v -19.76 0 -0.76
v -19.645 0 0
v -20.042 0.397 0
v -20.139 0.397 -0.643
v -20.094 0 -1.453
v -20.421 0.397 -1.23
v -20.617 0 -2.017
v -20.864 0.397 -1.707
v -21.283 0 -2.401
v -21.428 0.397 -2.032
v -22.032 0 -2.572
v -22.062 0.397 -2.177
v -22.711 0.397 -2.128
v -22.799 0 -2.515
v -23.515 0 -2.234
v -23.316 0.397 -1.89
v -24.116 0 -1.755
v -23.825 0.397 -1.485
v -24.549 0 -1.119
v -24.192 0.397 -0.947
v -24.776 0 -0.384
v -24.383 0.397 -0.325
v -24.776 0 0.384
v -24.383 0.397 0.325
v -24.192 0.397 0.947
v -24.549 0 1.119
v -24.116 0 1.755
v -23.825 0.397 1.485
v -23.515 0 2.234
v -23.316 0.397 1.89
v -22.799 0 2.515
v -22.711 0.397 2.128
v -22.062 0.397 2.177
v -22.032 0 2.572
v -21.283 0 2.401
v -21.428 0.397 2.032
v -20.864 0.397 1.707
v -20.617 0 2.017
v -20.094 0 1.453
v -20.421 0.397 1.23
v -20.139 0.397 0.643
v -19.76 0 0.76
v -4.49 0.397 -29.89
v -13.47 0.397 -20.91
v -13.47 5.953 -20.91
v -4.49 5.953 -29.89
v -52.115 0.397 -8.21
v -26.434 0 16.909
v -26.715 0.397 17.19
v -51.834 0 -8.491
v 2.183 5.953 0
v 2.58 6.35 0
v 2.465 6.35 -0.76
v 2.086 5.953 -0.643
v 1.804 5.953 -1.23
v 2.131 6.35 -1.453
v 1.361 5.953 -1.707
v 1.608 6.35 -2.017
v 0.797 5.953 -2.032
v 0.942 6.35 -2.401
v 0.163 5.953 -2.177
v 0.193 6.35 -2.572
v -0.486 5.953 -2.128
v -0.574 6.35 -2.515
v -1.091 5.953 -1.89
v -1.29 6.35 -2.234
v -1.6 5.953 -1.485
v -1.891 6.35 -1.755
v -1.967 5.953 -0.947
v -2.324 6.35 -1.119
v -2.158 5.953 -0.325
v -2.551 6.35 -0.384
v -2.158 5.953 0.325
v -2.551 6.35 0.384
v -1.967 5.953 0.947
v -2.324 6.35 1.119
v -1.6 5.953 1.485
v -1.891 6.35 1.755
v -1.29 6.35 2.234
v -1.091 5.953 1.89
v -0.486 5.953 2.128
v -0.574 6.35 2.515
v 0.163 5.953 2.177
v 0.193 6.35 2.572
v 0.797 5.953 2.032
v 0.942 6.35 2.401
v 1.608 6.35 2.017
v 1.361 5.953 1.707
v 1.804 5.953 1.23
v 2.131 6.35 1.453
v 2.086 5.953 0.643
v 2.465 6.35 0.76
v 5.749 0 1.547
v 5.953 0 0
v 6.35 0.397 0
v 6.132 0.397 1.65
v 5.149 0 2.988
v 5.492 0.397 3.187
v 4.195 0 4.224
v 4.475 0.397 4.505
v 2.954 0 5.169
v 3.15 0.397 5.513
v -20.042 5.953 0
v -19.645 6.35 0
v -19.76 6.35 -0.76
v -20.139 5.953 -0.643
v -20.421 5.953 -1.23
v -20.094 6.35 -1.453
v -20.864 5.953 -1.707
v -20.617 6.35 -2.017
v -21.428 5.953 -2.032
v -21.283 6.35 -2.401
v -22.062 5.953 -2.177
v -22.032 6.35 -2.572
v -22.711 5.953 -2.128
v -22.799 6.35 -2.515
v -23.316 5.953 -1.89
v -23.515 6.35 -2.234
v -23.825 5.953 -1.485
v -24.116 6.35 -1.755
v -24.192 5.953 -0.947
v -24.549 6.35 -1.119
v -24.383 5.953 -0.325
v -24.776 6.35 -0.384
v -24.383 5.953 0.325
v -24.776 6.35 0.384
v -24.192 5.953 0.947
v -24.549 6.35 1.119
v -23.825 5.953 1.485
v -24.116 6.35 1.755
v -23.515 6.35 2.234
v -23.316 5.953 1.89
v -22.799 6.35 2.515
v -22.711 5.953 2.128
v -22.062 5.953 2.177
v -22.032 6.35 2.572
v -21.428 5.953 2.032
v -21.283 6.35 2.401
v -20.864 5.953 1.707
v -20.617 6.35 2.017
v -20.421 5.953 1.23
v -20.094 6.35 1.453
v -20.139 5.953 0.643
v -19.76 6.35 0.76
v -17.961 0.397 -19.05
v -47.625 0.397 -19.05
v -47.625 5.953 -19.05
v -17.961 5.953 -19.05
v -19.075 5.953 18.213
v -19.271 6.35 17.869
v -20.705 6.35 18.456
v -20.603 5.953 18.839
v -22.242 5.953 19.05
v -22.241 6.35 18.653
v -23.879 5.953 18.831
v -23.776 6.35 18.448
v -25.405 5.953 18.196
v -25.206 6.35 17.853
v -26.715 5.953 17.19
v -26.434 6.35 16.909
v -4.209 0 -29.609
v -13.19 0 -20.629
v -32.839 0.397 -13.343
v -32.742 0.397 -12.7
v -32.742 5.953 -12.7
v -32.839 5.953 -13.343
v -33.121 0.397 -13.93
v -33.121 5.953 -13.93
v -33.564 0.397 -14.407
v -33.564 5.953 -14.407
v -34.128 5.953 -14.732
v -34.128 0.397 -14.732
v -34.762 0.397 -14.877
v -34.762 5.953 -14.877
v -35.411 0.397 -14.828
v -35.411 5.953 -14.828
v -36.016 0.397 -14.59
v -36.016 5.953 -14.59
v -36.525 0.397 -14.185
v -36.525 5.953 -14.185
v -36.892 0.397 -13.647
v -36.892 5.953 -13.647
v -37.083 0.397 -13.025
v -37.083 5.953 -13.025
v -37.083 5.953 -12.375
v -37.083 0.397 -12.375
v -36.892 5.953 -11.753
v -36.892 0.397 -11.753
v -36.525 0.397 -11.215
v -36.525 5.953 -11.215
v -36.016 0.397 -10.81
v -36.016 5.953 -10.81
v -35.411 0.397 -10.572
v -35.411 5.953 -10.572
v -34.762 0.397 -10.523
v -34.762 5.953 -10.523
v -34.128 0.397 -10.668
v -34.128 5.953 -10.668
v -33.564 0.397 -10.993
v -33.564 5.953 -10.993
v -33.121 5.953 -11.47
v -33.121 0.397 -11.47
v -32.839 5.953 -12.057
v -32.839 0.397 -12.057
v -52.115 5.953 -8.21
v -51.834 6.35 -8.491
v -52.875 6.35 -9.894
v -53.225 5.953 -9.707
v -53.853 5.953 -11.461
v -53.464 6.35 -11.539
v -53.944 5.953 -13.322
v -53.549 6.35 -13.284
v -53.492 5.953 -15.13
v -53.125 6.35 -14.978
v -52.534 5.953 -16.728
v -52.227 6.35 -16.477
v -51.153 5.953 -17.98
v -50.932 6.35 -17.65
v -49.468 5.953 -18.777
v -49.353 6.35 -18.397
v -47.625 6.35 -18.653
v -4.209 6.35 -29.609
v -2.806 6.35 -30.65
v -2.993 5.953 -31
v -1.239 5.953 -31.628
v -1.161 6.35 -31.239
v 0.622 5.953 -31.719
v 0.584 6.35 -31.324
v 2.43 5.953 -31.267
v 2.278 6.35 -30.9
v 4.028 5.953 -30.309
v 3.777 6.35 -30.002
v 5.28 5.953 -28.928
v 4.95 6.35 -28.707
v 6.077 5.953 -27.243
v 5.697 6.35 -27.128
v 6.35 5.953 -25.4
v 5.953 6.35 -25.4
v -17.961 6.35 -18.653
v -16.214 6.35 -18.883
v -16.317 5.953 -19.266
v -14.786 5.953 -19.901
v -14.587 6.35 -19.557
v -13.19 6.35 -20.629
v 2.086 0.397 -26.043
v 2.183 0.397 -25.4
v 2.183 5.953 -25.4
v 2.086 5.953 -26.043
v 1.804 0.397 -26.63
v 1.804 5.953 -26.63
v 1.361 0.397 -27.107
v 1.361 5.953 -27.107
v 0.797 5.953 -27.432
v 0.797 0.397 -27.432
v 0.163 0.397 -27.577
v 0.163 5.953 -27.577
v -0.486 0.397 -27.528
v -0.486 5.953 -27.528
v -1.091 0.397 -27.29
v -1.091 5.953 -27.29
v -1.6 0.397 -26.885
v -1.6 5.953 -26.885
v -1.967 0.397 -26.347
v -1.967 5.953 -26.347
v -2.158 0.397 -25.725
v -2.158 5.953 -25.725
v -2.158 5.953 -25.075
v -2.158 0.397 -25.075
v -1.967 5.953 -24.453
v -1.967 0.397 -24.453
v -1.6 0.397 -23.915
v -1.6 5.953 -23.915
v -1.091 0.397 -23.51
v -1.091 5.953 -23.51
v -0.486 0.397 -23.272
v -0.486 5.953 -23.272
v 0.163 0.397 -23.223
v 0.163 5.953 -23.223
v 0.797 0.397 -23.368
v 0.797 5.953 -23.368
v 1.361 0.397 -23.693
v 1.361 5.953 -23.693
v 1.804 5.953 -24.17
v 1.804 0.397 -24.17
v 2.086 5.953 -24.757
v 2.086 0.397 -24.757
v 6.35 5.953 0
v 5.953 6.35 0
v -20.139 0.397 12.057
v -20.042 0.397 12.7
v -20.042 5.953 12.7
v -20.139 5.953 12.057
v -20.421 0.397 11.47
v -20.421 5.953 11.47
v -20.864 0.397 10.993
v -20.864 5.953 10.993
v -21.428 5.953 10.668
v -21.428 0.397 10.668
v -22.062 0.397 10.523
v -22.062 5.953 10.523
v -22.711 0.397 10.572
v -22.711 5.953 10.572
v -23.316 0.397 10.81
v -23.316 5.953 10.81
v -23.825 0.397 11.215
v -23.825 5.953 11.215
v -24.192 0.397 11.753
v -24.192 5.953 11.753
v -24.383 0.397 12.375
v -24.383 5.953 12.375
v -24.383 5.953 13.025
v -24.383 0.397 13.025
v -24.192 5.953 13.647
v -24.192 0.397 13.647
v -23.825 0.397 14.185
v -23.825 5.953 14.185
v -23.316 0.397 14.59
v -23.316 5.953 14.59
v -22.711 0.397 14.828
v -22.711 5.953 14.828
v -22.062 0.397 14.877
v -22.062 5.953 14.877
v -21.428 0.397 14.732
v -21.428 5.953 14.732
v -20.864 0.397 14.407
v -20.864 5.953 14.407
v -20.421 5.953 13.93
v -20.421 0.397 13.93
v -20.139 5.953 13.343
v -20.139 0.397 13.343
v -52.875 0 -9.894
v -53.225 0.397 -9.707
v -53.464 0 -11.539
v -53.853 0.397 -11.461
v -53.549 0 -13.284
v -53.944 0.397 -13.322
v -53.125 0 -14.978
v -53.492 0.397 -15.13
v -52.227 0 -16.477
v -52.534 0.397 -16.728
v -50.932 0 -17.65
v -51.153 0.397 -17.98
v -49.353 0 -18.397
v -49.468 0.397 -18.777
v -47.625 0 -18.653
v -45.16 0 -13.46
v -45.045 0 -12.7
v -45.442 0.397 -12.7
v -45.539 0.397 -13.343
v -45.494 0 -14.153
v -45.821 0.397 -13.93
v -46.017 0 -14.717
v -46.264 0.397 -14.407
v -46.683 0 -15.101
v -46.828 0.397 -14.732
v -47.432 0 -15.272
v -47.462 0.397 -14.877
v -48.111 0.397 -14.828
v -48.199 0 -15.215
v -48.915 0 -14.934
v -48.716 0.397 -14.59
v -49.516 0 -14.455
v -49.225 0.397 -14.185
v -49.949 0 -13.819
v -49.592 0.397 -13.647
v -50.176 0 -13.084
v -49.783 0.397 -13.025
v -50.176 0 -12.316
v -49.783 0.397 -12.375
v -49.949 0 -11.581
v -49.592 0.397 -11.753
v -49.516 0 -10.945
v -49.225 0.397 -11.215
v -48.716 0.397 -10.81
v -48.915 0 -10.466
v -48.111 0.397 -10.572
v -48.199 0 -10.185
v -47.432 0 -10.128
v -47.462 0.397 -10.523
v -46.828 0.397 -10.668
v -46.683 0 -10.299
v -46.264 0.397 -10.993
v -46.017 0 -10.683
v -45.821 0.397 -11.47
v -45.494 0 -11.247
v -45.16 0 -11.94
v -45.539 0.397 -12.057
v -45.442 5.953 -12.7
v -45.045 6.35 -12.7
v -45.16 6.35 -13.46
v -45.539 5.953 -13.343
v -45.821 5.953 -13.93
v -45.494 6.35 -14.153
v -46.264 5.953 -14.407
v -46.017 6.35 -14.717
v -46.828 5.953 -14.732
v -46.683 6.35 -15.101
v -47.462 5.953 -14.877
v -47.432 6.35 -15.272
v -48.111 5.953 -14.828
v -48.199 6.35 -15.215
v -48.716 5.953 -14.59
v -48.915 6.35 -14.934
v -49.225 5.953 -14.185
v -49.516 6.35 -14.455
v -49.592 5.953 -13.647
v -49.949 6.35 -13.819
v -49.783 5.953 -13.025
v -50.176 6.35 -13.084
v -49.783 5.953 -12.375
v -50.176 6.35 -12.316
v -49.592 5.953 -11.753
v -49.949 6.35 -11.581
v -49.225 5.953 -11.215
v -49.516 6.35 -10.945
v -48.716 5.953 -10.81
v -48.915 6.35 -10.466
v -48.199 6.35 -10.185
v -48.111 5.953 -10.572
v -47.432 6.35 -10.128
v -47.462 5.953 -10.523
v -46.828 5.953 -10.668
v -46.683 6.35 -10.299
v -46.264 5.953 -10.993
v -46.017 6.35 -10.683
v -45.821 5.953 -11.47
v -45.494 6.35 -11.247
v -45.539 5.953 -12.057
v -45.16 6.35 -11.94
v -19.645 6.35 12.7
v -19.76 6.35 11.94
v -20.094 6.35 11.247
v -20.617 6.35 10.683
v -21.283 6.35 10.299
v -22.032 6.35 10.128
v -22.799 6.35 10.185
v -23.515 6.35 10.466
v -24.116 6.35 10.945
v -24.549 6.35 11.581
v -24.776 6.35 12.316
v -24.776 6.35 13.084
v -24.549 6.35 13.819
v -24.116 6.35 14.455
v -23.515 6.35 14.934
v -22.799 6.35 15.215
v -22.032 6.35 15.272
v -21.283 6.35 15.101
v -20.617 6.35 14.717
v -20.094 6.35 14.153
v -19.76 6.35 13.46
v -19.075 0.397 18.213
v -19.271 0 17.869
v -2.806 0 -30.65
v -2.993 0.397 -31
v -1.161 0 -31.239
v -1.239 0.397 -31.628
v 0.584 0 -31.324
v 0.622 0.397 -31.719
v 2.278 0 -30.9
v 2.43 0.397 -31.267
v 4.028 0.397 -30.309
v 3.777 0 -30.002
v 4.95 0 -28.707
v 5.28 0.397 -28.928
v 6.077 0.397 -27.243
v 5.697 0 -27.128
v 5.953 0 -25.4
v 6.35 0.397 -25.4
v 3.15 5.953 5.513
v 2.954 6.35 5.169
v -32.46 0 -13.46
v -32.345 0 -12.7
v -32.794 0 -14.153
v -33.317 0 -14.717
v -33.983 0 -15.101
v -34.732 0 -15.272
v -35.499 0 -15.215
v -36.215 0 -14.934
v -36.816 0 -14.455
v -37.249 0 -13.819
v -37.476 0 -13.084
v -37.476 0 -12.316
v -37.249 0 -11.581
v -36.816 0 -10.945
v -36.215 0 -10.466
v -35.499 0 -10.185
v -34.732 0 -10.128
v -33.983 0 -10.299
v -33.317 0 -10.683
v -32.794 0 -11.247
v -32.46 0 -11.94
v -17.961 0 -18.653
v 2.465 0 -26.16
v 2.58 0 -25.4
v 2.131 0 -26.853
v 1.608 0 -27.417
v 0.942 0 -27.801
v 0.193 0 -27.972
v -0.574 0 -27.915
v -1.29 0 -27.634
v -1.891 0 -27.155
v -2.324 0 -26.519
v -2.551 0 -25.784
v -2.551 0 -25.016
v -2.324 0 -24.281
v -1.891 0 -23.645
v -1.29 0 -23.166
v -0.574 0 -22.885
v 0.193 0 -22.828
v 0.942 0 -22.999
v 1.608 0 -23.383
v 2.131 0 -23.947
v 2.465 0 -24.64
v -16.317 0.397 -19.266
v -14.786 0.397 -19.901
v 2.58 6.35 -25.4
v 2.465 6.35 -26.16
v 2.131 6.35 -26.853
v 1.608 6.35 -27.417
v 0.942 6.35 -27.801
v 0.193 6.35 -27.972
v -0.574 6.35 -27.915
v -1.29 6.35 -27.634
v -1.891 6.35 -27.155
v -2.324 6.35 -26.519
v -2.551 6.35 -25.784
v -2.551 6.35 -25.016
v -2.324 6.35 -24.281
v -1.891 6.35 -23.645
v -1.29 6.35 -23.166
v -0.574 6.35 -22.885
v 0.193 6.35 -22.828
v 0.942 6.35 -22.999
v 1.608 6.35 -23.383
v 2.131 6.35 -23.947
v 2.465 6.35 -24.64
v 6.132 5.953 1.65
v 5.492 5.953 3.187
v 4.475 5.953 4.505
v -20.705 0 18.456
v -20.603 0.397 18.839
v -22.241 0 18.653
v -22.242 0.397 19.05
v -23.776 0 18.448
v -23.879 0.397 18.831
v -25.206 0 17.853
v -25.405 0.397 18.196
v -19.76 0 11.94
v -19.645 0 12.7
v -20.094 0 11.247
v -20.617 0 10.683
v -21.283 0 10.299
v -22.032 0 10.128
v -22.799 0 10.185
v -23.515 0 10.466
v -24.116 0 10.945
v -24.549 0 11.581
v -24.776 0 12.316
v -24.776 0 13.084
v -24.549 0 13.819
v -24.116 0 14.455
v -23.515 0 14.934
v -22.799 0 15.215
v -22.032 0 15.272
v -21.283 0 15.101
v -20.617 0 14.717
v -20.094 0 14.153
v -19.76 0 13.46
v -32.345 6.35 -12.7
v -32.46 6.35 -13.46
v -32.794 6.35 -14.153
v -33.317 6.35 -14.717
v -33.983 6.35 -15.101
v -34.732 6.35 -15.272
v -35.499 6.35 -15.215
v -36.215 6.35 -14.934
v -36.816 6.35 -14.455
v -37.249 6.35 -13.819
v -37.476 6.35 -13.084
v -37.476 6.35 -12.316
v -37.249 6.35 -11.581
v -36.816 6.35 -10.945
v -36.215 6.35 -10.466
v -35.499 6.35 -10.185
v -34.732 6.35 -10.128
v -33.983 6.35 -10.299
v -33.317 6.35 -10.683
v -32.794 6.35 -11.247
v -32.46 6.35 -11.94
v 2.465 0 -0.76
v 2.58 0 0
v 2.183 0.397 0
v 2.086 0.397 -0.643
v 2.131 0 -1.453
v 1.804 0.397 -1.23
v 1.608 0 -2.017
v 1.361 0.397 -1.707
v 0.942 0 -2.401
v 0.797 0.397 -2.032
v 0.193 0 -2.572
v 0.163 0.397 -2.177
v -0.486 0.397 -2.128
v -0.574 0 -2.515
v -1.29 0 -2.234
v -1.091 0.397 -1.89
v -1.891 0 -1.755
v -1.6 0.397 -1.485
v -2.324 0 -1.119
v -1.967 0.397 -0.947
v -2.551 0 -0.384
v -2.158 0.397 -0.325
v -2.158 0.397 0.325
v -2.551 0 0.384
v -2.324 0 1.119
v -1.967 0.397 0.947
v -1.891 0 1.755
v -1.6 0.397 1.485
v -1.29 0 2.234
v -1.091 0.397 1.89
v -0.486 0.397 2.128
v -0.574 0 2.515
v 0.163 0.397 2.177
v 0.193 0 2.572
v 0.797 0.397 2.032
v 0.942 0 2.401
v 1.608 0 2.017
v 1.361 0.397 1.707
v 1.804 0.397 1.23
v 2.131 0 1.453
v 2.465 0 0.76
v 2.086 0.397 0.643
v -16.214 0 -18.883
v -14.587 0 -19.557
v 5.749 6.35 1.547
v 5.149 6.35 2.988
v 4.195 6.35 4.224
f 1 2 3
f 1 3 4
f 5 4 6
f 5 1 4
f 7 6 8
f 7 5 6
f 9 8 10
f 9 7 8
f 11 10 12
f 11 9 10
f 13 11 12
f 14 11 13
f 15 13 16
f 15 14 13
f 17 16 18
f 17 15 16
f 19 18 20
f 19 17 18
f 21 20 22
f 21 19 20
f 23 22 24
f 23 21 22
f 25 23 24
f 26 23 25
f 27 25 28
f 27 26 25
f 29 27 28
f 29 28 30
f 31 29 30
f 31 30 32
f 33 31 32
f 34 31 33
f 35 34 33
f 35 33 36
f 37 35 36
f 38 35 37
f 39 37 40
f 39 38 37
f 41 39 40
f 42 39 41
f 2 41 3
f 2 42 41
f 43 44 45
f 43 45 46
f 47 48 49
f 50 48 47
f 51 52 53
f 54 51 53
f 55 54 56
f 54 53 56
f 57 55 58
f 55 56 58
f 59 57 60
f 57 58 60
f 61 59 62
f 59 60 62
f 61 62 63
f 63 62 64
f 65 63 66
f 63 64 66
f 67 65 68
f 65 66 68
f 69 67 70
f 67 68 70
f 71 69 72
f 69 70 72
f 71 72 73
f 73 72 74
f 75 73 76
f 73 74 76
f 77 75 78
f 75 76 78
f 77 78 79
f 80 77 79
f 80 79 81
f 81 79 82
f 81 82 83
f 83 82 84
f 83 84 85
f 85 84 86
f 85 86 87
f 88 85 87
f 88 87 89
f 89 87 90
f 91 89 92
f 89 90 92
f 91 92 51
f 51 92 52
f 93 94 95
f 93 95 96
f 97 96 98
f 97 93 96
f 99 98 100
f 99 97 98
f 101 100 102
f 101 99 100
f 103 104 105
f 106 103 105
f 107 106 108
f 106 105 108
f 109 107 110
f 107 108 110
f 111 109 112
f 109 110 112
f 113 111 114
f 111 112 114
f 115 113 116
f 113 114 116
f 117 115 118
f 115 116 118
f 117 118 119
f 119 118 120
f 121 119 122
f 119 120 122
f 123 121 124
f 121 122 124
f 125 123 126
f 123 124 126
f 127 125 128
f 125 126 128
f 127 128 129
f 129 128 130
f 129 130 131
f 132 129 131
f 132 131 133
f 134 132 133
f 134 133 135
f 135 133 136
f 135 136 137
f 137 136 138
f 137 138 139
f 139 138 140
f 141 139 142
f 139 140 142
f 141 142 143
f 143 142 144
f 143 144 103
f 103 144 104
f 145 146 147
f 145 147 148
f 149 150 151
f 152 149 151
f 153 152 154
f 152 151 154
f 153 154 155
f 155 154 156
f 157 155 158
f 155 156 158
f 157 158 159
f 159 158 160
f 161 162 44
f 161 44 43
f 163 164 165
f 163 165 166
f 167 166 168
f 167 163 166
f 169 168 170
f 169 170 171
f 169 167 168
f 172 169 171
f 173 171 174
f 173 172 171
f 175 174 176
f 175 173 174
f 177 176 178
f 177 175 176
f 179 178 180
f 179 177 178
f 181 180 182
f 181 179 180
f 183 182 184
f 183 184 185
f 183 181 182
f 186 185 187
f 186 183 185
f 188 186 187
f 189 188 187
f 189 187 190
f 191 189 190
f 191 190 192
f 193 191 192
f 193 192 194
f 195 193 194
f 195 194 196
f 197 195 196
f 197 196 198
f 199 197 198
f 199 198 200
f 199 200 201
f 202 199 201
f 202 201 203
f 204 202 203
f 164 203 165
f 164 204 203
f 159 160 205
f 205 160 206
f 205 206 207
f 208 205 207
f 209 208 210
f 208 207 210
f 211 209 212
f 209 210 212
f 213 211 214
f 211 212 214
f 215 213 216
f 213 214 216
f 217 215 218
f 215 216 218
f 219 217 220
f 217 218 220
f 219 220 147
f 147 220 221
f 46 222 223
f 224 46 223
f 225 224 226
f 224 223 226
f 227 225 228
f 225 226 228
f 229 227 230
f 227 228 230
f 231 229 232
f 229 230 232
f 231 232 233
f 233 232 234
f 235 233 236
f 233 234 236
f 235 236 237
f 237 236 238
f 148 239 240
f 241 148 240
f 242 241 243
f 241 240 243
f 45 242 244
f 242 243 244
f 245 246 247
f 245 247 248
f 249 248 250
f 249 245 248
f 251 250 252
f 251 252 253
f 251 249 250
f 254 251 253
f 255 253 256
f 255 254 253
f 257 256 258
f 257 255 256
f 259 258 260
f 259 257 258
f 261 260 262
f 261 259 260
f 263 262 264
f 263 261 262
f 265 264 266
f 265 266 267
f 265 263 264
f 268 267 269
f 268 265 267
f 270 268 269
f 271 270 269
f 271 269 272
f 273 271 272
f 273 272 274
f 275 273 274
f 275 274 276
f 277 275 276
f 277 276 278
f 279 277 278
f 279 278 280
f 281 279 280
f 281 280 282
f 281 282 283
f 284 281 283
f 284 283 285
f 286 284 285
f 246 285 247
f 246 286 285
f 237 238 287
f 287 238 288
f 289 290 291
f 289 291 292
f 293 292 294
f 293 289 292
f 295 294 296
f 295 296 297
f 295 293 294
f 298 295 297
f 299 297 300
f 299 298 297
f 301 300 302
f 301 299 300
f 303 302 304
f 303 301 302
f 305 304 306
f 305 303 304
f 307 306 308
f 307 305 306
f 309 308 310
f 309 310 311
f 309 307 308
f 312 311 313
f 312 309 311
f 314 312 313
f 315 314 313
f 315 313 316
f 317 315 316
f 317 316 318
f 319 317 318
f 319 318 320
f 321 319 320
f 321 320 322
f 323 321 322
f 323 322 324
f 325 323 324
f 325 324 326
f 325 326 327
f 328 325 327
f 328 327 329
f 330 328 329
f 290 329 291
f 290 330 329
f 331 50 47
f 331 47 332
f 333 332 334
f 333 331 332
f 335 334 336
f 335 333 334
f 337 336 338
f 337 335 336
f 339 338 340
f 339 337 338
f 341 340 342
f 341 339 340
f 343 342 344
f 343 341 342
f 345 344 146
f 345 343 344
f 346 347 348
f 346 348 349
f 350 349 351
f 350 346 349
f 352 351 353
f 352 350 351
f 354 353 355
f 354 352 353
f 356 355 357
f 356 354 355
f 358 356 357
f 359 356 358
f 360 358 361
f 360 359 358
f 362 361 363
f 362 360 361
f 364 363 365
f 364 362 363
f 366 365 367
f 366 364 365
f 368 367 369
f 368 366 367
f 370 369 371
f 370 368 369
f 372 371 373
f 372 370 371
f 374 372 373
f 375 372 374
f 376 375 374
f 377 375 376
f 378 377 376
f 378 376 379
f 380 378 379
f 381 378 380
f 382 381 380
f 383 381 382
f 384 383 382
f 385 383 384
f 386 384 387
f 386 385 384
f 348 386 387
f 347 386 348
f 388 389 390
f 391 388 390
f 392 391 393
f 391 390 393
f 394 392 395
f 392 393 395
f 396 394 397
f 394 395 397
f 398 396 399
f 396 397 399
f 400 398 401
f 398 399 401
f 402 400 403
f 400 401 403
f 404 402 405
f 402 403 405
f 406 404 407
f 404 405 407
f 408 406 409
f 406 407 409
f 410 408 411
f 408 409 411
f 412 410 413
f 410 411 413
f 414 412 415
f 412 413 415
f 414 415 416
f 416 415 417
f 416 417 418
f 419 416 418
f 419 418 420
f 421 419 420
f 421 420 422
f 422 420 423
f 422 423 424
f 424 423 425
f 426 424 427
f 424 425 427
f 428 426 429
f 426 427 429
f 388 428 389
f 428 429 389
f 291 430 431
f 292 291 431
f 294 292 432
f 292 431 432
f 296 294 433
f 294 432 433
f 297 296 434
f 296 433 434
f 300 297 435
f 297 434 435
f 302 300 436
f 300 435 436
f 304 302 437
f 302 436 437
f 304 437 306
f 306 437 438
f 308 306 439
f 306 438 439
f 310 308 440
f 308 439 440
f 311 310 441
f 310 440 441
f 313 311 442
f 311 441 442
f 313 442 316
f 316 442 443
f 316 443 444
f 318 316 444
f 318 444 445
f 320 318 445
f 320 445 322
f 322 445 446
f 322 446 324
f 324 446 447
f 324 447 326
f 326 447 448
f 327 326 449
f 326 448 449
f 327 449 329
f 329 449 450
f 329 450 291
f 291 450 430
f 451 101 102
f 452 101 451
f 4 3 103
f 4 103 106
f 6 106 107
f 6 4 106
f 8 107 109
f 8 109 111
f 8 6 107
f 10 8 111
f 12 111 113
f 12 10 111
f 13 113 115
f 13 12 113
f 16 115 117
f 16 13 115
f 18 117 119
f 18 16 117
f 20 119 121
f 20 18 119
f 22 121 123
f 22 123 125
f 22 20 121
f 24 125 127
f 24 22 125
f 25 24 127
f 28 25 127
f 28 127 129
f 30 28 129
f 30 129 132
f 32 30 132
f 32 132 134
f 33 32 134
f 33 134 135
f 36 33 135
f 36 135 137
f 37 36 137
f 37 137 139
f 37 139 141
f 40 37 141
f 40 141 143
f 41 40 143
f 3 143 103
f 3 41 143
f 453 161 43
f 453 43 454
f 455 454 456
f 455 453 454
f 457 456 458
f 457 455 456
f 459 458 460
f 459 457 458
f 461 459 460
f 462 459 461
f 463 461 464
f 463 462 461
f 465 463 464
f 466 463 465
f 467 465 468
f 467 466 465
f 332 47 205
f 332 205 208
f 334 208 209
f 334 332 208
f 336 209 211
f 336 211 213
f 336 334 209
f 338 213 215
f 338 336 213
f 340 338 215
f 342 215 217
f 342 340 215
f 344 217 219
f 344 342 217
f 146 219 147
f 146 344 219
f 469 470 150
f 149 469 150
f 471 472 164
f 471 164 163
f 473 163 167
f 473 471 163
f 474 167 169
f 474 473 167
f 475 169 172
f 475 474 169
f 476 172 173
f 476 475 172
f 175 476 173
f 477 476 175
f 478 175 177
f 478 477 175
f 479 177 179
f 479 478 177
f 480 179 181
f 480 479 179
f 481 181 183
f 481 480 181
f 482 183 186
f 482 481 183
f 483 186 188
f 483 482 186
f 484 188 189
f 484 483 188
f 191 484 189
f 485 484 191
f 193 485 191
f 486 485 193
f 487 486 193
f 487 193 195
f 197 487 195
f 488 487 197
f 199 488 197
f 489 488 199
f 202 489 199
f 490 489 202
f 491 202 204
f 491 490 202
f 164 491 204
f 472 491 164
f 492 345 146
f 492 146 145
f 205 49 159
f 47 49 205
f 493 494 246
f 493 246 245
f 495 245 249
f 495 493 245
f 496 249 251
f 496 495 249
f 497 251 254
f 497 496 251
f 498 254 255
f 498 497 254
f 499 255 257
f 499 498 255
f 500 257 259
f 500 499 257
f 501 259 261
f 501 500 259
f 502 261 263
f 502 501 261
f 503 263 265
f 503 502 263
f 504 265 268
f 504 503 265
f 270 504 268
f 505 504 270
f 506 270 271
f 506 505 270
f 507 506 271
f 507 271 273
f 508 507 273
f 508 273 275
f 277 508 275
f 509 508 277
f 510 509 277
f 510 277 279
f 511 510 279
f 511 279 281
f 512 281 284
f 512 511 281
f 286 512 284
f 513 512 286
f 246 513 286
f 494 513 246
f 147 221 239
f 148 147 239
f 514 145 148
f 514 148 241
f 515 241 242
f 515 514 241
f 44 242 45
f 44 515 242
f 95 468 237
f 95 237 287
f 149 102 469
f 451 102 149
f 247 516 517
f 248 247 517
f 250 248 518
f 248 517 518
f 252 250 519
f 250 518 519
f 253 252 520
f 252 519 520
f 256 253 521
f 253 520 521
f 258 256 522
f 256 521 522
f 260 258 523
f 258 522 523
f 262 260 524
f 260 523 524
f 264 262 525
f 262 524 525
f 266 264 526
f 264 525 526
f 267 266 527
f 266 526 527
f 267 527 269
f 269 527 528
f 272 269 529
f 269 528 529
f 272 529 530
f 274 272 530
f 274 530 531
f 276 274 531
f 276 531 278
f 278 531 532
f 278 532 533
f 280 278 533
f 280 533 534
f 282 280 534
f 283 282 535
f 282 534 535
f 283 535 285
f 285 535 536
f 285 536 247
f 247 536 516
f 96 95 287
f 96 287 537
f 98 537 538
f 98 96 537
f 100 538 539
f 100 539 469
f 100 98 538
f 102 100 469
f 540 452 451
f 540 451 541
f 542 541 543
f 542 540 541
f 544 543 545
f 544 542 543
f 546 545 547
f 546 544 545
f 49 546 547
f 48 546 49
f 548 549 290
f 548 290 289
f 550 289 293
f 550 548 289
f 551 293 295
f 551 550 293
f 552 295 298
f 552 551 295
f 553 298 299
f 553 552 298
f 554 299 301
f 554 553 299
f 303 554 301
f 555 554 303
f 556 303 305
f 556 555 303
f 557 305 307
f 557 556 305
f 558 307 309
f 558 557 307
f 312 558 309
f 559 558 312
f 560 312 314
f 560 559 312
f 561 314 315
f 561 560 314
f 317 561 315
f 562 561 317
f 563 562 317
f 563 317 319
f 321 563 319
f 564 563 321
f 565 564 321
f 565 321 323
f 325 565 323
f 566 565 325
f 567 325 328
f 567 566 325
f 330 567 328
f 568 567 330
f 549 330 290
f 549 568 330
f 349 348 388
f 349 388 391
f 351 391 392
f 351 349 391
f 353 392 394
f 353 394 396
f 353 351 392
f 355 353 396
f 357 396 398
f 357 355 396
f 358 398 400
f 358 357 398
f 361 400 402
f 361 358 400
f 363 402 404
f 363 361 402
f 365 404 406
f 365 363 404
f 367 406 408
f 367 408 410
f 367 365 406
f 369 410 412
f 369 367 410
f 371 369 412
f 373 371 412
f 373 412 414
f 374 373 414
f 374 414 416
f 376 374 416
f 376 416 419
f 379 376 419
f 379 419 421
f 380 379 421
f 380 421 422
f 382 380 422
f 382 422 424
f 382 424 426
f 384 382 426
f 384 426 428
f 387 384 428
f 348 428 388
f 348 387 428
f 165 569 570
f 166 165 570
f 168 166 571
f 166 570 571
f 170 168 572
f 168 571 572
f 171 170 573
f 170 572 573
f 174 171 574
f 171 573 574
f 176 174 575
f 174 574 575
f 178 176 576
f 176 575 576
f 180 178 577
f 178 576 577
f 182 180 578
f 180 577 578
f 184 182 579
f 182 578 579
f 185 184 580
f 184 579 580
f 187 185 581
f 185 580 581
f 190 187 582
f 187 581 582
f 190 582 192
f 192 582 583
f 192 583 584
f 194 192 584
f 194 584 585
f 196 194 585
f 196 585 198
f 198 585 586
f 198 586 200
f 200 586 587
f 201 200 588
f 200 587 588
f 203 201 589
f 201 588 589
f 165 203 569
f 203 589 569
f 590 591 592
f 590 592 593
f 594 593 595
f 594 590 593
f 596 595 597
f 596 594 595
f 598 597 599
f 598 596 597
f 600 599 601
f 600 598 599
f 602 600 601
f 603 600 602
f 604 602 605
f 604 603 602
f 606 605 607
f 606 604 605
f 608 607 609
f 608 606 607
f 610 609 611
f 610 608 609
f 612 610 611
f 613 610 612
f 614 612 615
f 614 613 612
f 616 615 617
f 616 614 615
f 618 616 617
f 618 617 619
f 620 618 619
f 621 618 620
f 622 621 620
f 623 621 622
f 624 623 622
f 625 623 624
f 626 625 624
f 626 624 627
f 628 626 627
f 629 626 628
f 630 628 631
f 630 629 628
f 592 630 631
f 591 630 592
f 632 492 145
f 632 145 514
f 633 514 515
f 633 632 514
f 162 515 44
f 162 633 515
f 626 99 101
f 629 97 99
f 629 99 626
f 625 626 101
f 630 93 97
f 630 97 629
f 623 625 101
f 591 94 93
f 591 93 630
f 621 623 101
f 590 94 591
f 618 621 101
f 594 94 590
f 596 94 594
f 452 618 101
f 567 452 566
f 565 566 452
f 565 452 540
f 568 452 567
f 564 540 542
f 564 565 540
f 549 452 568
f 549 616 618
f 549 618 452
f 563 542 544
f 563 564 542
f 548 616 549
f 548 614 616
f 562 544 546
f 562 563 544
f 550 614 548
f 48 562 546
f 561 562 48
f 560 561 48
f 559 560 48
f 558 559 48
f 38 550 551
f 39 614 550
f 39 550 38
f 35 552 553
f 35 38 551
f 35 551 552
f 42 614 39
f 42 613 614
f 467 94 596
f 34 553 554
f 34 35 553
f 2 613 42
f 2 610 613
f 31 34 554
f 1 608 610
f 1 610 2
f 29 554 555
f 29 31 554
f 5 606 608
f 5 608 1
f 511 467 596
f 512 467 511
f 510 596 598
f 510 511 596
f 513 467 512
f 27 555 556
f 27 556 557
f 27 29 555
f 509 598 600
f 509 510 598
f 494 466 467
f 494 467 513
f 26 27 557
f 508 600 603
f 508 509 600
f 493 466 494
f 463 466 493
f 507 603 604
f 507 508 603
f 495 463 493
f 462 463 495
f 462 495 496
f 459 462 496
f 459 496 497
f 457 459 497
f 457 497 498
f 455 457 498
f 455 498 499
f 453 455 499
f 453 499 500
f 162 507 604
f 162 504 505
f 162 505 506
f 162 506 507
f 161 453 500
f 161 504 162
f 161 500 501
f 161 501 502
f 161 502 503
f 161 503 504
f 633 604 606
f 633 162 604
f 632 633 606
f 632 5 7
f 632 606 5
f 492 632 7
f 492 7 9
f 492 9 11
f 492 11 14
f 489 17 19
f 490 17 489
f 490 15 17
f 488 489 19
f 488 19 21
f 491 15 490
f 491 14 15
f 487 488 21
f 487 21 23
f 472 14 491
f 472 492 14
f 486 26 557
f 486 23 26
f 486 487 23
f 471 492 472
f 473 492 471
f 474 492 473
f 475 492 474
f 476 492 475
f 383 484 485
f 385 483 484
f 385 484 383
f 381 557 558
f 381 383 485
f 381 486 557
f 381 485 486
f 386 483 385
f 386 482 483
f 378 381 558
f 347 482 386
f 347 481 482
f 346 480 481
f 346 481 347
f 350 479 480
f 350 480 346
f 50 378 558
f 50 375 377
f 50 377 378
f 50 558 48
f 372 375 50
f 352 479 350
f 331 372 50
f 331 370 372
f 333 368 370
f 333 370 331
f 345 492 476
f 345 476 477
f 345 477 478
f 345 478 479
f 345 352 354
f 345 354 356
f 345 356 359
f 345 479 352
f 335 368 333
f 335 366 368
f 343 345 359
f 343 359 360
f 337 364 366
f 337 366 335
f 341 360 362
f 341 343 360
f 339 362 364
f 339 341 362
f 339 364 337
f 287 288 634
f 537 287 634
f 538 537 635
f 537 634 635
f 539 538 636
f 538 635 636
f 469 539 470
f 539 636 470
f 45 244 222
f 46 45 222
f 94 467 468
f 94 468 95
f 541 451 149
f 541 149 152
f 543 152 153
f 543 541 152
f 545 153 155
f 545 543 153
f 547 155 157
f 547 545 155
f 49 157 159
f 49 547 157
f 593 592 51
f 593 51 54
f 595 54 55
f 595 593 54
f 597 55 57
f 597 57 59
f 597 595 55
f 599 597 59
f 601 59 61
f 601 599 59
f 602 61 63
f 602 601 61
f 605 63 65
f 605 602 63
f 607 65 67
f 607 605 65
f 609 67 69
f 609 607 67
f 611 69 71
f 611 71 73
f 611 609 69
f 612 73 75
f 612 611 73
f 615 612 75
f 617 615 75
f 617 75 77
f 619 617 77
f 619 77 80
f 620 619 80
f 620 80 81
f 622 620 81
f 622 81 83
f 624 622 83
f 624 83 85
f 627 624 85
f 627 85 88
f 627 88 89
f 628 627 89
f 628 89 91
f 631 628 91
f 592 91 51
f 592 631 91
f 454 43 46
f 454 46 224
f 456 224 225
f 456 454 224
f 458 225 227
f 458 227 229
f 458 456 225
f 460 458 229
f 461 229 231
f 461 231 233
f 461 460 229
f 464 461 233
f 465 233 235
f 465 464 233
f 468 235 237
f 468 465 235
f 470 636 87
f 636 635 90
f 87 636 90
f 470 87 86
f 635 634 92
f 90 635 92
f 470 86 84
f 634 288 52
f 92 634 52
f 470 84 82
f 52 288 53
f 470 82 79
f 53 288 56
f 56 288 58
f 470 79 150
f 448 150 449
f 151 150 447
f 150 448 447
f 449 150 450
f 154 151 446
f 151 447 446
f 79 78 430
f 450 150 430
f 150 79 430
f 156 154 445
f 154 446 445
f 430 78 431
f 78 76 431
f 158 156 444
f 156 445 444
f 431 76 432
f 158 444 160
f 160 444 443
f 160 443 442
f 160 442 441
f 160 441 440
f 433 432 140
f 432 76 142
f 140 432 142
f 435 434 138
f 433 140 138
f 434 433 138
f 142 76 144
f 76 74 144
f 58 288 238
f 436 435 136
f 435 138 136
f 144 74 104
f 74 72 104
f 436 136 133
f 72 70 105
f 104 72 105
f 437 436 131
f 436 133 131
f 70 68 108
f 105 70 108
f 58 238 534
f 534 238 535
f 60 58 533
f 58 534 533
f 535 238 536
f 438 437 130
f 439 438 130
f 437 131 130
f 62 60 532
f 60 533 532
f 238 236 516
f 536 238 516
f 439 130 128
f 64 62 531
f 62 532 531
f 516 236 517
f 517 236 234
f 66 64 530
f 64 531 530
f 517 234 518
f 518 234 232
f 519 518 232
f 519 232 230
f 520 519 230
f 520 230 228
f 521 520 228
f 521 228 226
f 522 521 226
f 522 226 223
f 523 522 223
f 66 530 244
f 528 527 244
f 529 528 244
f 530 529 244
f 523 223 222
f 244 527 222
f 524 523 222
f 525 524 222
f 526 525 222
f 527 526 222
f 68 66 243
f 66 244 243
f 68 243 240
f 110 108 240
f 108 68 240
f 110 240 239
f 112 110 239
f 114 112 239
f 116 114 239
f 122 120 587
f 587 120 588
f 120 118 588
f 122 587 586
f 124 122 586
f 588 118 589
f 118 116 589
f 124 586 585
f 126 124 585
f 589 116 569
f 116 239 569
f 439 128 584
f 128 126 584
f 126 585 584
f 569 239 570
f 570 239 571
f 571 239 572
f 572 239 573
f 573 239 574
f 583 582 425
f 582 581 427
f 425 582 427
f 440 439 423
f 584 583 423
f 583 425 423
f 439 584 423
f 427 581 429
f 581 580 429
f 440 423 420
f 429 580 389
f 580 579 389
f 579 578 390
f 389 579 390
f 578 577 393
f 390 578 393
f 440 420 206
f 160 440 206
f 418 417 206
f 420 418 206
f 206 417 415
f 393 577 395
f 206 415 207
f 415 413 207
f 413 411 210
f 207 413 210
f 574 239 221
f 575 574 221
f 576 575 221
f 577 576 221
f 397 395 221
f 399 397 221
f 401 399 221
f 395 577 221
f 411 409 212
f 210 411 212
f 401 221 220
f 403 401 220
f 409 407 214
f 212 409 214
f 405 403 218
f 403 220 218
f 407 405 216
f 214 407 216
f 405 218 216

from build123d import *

# Parameters (mm, degrees)
SKETCH1_R           = 2.1828125
BOSS_EXTRUDE1_DEPTH = 6.35
CHAMFER1_SIZE       = 0.396875


with BuildPart() as part:
    # Sketch1 → Boss-Extrude1 (new body)
    with BuildSketch(Plane(origin=(0, 0, 0), x_dir=(1, 0, 0), z_dir=(0, 1, 0))):
        with BuildLine():
            Line((6.35, 25.4), (6.35, 0))
            ThreePointArc((6.35, 0), (5.492179091, -3.187235296), (3.150482259, -5.513343952))
            Line((3.150482259, -5.513343952), (-19.074517741, -18.213343952))
            ThreePointArc((-19.074517741, -18.213343952), (-23.067855509, -18.993813994), (-26.715128061, -17.190128061))
            Line((-26.715128061, -17.190128061), (-52.115128061, 8.209871939))
            ThreePointArc((-52.115128061, 8.209871939), (-53.491635031, 15.130039796), (-47.625, 19.05))
            Line((-47.625, 19.05), (-17.960512242, 19.05))
            ThreePointArc((-17.960512242, 19.05), (-15.530472447, 19.533364969), (-13.470384182, 20.909871939))
            Line((-13.470384182, 20.909871939), (-4.490128061, 29.890128061))
            ThreePointArc((-4.490128061, 29.890128061), (2.430039796, 31.266635031), (6.35, 25.4))
        make_face()
        Circle(SKETCH1_R, mode=Mode.SUBTRACT)
        with Locations((0, 25.4)):
            Circle(SKETCH1_R, mode=Mode.SUBTRACT)
        with Locations((-22.225, 0)):
            Circle(SKETCH1_R, mode=Mode.SUBTRACT)
        with Locations((-22.225, -12.7)):
            Circle(SKETCH1_R, mode=Mode.SUBTRACT)
        with Locations((-34.925, 12.7)):
            Circle(SKETCH1_R, mode=Mode.SUBTRACT)
        with Locations((-47.625, 12.7)):
            Circle(SKETCH1_R, mode=Mode.SUBTRACT)
    extrude(amount=BOSS_EXTRUDE1_DEPTH)

    # Chamfer1
    chamfer1_edges = [part.edges().sort_by_distance(p)[0] for p in [
        (-32.792756121, 0, -19.05),
        (-15.530472447, 0, -19.533364969),
        (-8.980256121, 0, -25.4),
        (2.430039796, 0, -31.266635031),
        (6.35, 0, -12.7),
        (5.492179091, 0, 3.187235296),
        (-7.962017741, 0, 11.863343952),
        (-23.067855509, 6.35, 18.993813994),
        (-23.067855509, 0, 18.993813994),
        (-39.415128061, 0, 4.490128061),
        (-53.491635031, 0, -15.130039796),
        (-7.962017741, 6.35, 11.863343952),
        (5.492179091, 6.35, 3.187235296),
        (6.35, 6.35, -12.7),
        (-2.1828125, 0, 0),
        (-2.1828125, 6.35, 0),
        (2.430039796, 6.35, -31.266635031),
        (-2.1828125, 0, -25.4),
        (-2.1828125, 6.35, -25.4),
        (-8.980256121, 6.35, -25.4),
        (-24.4078125, 0, 0),
        (-24.4078125, 6.35, 0),
        (-15.530472447, 6.35, -19.533364969),
        (-24.4078125, 0, 12.7),
        (-24.4078125, 6.35, 12.7),
        (-32.792756121, 6.35, -19.05),
        (-37.1078125, 0, -12.7),
        (-37.1078125, 6.35, -12.7),
        (-49.8078125, 0, -12.7),
        (-49.8078125, 6.35, -12.7),
        (-53.491635031, 6.35, -15.130039796),
        (-39.415128061, 6.35, 4.490128061),
    ]]
    chamfer(chamfer1_edges, length=CHAMFER1_SIZE)


solid = part.part
